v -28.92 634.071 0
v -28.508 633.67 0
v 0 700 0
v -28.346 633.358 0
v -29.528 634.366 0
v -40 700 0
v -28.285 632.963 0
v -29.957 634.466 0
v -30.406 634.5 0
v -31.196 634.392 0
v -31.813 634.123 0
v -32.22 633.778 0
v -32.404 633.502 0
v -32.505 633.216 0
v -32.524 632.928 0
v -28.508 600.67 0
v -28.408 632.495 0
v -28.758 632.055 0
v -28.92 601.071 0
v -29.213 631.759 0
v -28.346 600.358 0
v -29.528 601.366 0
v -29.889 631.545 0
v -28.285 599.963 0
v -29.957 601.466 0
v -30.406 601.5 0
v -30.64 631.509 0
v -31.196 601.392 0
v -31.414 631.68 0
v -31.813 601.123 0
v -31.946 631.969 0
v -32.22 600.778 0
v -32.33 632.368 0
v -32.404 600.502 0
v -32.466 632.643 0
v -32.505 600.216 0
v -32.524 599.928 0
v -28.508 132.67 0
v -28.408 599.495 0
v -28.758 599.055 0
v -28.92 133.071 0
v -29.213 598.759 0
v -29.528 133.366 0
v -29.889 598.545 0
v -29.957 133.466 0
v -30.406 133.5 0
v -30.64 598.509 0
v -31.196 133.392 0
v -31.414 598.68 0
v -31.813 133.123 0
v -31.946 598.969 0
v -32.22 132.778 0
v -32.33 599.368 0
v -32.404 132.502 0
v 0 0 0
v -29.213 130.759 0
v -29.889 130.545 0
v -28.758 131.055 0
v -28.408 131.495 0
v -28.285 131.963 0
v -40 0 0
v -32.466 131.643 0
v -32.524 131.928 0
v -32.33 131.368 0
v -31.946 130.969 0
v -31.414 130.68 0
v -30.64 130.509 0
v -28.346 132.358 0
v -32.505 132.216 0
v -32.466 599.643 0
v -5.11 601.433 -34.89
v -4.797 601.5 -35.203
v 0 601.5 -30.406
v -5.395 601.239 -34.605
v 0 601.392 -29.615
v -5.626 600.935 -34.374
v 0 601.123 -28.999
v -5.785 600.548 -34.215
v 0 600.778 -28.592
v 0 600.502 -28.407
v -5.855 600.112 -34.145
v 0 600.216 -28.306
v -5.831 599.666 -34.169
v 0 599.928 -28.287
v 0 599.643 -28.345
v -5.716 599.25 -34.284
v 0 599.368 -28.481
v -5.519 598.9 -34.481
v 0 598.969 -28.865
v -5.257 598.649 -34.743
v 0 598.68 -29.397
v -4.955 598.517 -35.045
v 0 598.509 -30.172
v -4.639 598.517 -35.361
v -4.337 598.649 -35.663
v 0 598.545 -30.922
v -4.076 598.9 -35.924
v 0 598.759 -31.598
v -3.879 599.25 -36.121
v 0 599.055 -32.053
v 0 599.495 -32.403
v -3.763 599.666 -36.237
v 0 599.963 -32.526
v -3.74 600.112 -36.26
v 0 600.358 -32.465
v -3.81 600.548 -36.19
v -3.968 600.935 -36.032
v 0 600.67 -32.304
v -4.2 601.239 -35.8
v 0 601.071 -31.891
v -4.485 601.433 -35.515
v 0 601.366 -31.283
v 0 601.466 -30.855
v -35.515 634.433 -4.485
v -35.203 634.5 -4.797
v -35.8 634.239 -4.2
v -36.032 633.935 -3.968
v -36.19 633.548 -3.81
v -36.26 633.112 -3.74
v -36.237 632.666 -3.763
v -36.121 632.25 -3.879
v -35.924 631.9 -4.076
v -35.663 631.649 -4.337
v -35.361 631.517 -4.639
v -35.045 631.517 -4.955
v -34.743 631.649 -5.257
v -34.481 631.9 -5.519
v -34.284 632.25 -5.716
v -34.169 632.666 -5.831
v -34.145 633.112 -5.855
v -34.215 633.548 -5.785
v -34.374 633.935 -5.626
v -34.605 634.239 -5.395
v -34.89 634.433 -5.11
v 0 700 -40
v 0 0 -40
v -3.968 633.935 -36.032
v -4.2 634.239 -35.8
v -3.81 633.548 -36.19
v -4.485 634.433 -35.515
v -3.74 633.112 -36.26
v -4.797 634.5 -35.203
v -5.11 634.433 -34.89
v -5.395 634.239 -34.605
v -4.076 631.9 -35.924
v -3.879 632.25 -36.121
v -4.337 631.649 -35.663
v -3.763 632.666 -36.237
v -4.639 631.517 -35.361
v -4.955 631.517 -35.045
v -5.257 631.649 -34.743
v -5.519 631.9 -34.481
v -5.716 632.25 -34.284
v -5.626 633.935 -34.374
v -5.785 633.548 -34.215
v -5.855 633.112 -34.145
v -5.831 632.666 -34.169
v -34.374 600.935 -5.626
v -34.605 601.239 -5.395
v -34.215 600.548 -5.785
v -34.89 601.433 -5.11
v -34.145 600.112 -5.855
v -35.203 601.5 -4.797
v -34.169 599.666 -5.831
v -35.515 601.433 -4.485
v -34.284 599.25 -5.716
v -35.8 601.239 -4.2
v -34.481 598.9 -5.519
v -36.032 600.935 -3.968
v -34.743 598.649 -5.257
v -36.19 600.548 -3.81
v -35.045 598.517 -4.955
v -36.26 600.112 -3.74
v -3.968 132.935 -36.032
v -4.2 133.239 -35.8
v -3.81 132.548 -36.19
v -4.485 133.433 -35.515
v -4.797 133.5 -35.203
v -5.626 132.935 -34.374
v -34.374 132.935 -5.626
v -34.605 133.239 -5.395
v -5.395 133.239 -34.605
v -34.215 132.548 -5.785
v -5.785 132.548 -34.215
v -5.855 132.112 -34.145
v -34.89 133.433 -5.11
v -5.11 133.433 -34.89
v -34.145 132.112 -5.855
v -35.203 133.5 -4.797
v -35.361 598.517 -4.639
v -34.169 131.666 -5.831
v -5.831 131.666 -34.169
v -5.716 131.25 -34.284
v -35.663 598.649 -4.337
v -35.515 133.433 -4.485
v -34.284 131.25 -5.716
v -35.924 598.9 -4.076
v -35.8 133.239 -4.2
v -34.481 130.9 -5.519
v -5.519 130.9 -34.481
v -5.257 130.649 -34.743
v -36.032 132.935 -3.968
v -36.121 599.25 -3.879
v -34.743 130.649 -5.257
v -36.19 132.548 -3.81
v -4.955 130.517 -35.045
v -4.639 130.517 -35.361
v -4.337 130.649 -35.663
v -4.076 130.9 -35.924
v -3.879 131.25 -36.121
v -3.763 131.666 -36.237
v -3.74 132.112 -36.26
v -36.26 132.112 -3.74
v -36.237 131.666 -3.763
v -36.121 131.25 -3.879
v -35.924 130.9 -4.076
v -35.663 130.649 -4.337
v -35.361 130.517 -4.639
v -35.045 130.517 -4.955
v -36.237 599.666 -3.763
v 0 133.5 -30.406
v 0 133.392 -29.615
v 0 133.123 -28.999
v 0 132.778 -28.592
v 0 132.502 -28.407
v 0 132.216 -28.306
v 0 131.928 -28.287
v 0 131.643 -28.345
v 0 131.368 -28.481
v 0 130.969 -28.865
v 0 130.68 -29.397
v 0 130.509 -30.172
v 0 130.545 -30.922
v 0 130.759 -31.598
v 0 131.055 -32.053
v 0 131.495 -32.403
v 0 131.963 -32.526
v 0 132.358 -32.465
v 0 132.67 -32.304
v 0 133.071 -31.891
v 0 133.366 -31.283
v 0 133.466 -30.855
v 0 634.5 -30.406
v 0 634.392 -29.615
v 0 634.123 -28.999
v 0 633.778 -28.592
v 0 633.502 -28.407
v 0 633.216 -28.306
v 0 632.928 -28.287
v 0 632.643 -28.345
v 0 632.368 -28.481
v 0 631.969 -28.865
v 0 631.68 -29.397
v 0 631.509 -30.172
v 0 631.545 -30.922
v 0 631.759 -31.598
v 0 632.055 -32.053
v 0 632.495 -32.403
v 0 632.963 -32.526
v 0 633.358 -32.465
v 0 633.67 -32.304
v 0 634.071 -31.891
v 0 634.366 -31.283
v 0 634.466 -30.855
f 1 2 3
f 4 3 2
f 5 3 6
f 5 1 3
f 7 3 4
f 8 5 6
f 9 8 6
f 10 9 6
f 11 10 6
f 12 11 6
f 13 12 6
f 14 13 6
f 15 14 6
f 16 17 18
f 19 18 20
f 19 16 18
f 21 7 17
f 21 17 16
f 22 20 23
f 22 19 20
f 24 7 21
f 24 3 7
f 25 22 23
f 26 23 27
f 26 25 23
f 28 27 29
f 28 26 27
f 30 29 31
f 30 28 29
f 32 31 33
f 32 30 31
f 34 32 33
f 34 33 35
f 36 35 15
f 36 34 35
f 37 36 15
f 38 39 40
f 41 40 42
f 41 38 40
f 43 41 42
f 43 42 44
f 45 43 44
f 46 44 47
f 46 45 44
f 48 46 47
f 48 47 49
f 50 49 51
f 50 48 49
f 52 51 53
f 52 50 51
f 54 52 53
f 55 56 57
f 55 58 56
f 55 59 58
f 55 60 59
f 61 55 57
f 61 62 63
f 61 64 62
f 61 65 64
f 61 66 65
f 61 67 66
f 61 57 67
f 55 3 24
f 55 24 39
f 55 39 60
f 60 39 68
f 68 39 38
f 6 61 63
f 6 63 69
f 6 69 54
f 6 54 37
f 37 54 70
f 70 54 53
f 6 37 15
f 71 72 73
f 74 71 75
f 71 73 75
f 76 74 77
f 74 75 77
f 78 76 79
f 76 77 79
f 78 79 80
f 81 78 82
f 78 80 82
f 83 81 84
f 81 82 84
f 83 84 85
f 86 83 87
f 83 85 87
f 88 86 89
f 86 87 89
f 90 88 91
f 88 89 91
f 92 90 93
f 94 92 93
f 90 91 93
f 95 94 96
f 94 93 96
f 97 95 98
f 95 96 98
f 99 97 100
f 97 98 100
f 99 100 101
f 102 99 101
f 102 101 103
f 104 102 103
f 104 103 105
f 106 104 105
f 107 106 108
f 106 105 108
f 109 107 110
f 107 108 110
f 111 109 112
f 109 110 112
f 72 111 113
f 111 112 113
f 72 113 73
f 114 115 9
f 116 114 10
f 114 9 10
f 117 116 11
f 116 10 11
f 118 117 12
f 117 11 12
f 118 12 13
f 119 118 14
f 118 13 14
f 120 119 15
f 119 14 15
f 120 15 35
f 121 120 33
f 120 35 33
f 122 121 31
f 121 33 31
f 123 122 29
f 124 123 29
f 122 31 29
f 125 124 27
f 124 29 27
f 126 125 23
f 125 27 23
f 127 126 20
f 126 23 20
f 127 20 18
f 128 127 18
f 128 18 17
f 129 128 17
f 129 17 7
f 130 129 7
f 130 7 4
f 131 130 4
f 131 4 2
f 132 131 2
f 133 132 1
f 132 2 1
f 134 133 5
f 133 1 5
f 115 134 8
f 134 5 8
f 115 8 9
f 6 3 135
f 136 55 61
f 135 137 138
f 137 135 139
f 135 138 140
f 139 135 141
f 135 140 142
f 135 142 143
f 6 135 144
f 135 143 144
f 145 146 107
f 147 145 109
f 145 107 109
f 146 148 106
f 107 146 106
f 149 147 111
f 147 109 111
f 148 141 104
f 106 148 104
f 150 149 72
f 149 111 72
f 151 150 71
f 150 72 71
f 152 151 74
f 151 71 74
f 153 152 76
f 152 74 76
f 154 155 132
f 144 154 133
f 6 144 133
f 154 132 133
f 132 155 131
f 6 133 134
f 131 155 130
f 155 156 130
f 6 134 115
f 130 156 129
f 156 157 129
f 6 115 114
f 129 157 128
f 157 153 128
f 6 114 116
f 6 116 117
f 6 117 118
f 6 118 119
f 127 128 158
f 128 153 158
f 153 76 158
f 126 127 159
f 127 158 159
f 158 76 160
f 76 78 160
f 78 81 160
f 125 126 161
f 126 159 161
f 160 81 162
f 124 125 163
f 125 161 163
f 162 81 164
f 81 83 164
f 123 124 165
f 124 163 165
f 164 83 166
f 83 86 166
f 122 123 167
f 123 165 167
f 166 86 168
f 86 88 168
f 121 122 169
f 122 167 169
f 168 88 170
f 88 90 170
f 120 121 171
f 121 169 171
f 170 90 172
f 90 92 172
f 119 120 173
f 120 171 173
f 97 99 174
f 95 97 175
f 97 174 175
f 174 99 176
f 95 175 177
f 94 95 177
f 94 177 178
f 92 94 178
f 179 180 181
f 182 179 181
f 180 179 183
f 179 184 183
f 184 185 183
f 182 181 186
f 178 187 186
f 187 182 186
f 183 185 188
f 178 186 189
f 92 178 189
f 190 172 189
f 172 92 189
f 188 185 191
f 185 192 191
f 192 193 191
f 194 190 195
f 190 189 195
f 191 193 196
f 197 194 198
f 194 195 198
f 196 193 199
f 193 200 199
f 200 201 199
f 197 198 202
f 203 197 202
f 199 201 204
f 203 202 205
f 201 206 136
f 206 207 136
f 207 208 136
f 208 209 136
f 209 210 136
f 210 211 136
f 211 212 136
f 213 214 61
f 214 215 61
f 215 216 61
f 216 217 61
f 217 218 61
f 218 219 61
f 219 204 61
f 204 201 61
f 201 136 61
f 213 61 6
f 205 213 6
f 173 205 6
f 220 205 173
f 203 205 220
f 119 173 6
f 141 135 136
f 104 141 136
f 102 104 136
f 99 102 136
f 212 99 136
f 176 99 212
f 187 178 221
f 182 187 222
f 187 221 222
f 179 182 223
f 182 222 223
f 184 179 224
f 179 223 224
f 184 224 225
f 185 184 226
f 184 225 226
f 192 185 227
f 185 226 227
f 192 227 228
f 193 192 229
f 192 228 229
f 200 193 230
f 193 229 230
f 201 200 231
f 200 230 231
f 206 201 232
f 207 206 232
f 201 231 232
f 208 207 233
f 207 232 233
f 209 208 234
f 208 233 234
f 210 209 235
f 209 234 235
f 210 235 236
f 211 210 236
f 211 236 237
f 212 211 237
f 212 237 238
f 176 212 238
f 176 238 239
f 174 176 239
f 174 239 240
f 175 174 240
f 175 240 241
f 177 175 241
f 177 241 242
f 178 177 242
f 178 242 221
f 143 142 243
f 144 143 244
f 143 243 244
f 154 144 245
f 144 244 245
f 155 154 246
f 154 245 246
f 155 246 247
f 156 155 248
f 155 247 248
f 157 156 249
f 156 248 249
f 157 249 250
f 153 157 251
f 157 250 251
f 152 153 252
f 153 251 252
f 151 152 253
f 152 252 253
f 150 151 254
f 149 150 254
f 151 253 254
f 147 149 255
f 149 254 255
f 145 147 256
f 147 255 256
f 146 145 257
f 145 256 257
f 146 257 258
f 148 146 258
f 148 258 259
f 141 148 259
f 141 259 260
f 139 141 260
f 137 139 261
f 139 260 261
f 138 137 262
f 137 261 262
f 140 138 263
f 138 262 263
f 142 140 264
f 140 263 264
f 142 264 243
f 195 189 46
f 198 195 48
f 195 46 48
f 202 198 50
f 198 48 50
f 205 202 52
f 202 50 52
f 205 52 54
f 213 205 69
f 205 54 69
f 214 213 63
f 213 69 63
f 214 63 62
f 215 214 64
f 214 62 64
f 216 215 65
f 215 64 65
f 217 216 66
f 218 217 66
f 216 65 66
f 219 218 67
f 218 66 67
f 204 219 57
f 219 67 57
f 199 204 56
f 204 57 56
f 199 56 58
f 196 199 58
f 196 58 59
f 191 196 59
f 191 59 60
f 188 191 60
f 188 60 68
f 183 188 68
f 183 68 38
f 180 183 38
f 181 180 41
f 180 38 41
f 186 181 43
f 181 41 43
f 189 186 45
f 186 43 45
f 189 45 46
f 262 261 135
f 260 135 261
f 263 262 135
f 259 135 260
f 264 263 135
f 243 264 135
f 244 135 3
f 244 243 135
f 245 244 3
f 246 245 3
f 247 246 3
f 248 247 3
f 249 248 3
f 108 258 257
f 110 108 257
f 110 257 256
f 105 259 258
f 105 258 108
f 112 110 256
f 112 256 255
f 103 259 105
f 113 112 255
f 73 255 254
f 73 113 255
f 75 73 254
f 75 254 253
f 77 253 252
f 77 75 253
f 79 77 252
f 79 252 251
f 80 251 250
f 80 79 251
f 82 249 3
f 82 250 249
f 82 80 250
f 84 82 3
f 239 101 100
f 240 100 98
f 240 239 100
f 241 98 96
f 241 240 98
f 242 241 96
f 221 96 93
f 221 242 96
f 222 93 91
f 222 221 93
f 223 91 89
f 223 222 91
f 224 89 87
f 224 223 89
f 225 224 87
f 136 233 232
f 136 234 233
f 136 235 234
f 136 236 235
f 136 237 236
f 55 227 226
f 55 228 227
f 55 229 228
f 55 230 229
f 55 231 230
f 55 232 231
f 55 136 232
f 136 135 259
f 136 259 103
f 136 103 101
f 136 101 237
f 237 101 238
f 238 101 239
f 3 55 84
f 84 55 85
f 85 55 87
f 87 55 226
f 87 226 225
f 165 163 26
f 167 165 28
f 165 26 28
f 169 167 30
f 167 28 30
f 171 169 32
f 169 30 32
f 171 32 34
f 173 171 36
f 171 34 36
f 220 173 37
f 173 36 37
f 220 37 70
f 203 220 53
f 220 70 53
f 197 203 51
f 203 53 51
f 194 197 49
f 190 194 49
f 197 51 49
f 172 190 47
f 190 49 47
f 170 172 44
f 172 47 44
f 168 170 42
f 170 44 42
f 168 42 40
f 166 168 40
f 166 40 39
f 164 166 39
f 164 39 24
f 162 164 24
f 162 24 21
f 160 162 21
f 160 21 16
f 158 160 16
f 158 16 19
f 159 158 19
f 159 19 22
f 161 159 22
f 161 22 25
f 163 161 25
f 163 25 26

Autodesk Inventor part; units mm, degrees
ref_plane "YZ Plane" through (0, 0, 0) normal (1, 0, 0) x (0, 1, 0)
ref_plane "XZ Plane" through (0, 0, 0) normal (0, 1, 0) x (-1, 0, 0)
ref_plane "XY Plane" through (0, 0, 0) normal (0, 0, 1) x (1, 0, 0)
sketch "Esboço1" plane through (0, 0, 0) normal (0, 1, 0) x (-1, 0, 0)
  line L0 (0, 0) -> (40, 0)
  line L1 (0, -40) -> (0, 0)
  line L2 (0, -40) -> (40, 0)
extrude "Extrusão1" add sketch "Esboço1" along normal blind 700
sketch "Esboço2" plane through (-40, 0, 0) normal (-0.7071, 0, -0.7071) x (-0.7071, 0, 0.7071)
  line L0 (0, 700) -> (-28.2843, 700) projected
  line L1 (-28.2843, 700) -> (-28.2843, 600)
  line L2 (-28.2843, 0) -> (-28.2843, 700) projected
  line L3 (-28.2843, 600) -> (-6.7843, 600)
  line L4 (-6.7843, 600) -> (-28.2843, 600)
  line L5 (-28.2843, 600) -> (-49.7843, 600)
  dimension "d4" = 100
  dimension "d5" = 21.5
  dimension "d6" = 21.5
hole "Furo1" at (-35.2028, 600, -4.7972) at (-4.7972, 600, -35.2028) direction (0.7071, 0, 0.7071) diameter 3 end through all
sketch "Esboço3" plane through (-40, 0, 0) normal (-0.7071, 0, -0.7071) x (-0.7071, 0, 0.7071)
  circle A0 centre (-6.7843, 600) radius 1.5 projected
  line L0 (-6.7843, 600) -> (-6.7843, 132)
  circle A1 centre (-49.7843, 600) radius 1.5 projected
  line L1 (-49.7843, 600) -> (-49.7843, 132)
  point P0 (-28.2843, 0)
  dimension "d14" = 468
  dimension "d15" = 468
hole "Furo2" at (-35.2028, 132, -4.7972) at (-4.7972, 132, -35.2028) direction (0.7071, 0, 0.7071) diameter 3 end through all
sketch "Esboço4" plane through (-40, 0, 0) normal (-0.7071, 0, -0.7071) x (-0.7071, 0, 0.7071)
  circle A0 centre (-49.7843, 600) radius 1.5 projected
  line L0 (-49.7843, 600) -> (-49.7843, 633)
  point P0 (-28.2843, 0)
  point P1 (-6.7843, 633)
  dimension "d23" = 33
hole "Furo3" at (-4.7972, 633, -35.2028) at (-35.2028, 633, -4.7972) direction (0.7071, 0, 0.7071) diameter 3 end through all
properties part number "coluna" material "Madeira (Bétula)"
